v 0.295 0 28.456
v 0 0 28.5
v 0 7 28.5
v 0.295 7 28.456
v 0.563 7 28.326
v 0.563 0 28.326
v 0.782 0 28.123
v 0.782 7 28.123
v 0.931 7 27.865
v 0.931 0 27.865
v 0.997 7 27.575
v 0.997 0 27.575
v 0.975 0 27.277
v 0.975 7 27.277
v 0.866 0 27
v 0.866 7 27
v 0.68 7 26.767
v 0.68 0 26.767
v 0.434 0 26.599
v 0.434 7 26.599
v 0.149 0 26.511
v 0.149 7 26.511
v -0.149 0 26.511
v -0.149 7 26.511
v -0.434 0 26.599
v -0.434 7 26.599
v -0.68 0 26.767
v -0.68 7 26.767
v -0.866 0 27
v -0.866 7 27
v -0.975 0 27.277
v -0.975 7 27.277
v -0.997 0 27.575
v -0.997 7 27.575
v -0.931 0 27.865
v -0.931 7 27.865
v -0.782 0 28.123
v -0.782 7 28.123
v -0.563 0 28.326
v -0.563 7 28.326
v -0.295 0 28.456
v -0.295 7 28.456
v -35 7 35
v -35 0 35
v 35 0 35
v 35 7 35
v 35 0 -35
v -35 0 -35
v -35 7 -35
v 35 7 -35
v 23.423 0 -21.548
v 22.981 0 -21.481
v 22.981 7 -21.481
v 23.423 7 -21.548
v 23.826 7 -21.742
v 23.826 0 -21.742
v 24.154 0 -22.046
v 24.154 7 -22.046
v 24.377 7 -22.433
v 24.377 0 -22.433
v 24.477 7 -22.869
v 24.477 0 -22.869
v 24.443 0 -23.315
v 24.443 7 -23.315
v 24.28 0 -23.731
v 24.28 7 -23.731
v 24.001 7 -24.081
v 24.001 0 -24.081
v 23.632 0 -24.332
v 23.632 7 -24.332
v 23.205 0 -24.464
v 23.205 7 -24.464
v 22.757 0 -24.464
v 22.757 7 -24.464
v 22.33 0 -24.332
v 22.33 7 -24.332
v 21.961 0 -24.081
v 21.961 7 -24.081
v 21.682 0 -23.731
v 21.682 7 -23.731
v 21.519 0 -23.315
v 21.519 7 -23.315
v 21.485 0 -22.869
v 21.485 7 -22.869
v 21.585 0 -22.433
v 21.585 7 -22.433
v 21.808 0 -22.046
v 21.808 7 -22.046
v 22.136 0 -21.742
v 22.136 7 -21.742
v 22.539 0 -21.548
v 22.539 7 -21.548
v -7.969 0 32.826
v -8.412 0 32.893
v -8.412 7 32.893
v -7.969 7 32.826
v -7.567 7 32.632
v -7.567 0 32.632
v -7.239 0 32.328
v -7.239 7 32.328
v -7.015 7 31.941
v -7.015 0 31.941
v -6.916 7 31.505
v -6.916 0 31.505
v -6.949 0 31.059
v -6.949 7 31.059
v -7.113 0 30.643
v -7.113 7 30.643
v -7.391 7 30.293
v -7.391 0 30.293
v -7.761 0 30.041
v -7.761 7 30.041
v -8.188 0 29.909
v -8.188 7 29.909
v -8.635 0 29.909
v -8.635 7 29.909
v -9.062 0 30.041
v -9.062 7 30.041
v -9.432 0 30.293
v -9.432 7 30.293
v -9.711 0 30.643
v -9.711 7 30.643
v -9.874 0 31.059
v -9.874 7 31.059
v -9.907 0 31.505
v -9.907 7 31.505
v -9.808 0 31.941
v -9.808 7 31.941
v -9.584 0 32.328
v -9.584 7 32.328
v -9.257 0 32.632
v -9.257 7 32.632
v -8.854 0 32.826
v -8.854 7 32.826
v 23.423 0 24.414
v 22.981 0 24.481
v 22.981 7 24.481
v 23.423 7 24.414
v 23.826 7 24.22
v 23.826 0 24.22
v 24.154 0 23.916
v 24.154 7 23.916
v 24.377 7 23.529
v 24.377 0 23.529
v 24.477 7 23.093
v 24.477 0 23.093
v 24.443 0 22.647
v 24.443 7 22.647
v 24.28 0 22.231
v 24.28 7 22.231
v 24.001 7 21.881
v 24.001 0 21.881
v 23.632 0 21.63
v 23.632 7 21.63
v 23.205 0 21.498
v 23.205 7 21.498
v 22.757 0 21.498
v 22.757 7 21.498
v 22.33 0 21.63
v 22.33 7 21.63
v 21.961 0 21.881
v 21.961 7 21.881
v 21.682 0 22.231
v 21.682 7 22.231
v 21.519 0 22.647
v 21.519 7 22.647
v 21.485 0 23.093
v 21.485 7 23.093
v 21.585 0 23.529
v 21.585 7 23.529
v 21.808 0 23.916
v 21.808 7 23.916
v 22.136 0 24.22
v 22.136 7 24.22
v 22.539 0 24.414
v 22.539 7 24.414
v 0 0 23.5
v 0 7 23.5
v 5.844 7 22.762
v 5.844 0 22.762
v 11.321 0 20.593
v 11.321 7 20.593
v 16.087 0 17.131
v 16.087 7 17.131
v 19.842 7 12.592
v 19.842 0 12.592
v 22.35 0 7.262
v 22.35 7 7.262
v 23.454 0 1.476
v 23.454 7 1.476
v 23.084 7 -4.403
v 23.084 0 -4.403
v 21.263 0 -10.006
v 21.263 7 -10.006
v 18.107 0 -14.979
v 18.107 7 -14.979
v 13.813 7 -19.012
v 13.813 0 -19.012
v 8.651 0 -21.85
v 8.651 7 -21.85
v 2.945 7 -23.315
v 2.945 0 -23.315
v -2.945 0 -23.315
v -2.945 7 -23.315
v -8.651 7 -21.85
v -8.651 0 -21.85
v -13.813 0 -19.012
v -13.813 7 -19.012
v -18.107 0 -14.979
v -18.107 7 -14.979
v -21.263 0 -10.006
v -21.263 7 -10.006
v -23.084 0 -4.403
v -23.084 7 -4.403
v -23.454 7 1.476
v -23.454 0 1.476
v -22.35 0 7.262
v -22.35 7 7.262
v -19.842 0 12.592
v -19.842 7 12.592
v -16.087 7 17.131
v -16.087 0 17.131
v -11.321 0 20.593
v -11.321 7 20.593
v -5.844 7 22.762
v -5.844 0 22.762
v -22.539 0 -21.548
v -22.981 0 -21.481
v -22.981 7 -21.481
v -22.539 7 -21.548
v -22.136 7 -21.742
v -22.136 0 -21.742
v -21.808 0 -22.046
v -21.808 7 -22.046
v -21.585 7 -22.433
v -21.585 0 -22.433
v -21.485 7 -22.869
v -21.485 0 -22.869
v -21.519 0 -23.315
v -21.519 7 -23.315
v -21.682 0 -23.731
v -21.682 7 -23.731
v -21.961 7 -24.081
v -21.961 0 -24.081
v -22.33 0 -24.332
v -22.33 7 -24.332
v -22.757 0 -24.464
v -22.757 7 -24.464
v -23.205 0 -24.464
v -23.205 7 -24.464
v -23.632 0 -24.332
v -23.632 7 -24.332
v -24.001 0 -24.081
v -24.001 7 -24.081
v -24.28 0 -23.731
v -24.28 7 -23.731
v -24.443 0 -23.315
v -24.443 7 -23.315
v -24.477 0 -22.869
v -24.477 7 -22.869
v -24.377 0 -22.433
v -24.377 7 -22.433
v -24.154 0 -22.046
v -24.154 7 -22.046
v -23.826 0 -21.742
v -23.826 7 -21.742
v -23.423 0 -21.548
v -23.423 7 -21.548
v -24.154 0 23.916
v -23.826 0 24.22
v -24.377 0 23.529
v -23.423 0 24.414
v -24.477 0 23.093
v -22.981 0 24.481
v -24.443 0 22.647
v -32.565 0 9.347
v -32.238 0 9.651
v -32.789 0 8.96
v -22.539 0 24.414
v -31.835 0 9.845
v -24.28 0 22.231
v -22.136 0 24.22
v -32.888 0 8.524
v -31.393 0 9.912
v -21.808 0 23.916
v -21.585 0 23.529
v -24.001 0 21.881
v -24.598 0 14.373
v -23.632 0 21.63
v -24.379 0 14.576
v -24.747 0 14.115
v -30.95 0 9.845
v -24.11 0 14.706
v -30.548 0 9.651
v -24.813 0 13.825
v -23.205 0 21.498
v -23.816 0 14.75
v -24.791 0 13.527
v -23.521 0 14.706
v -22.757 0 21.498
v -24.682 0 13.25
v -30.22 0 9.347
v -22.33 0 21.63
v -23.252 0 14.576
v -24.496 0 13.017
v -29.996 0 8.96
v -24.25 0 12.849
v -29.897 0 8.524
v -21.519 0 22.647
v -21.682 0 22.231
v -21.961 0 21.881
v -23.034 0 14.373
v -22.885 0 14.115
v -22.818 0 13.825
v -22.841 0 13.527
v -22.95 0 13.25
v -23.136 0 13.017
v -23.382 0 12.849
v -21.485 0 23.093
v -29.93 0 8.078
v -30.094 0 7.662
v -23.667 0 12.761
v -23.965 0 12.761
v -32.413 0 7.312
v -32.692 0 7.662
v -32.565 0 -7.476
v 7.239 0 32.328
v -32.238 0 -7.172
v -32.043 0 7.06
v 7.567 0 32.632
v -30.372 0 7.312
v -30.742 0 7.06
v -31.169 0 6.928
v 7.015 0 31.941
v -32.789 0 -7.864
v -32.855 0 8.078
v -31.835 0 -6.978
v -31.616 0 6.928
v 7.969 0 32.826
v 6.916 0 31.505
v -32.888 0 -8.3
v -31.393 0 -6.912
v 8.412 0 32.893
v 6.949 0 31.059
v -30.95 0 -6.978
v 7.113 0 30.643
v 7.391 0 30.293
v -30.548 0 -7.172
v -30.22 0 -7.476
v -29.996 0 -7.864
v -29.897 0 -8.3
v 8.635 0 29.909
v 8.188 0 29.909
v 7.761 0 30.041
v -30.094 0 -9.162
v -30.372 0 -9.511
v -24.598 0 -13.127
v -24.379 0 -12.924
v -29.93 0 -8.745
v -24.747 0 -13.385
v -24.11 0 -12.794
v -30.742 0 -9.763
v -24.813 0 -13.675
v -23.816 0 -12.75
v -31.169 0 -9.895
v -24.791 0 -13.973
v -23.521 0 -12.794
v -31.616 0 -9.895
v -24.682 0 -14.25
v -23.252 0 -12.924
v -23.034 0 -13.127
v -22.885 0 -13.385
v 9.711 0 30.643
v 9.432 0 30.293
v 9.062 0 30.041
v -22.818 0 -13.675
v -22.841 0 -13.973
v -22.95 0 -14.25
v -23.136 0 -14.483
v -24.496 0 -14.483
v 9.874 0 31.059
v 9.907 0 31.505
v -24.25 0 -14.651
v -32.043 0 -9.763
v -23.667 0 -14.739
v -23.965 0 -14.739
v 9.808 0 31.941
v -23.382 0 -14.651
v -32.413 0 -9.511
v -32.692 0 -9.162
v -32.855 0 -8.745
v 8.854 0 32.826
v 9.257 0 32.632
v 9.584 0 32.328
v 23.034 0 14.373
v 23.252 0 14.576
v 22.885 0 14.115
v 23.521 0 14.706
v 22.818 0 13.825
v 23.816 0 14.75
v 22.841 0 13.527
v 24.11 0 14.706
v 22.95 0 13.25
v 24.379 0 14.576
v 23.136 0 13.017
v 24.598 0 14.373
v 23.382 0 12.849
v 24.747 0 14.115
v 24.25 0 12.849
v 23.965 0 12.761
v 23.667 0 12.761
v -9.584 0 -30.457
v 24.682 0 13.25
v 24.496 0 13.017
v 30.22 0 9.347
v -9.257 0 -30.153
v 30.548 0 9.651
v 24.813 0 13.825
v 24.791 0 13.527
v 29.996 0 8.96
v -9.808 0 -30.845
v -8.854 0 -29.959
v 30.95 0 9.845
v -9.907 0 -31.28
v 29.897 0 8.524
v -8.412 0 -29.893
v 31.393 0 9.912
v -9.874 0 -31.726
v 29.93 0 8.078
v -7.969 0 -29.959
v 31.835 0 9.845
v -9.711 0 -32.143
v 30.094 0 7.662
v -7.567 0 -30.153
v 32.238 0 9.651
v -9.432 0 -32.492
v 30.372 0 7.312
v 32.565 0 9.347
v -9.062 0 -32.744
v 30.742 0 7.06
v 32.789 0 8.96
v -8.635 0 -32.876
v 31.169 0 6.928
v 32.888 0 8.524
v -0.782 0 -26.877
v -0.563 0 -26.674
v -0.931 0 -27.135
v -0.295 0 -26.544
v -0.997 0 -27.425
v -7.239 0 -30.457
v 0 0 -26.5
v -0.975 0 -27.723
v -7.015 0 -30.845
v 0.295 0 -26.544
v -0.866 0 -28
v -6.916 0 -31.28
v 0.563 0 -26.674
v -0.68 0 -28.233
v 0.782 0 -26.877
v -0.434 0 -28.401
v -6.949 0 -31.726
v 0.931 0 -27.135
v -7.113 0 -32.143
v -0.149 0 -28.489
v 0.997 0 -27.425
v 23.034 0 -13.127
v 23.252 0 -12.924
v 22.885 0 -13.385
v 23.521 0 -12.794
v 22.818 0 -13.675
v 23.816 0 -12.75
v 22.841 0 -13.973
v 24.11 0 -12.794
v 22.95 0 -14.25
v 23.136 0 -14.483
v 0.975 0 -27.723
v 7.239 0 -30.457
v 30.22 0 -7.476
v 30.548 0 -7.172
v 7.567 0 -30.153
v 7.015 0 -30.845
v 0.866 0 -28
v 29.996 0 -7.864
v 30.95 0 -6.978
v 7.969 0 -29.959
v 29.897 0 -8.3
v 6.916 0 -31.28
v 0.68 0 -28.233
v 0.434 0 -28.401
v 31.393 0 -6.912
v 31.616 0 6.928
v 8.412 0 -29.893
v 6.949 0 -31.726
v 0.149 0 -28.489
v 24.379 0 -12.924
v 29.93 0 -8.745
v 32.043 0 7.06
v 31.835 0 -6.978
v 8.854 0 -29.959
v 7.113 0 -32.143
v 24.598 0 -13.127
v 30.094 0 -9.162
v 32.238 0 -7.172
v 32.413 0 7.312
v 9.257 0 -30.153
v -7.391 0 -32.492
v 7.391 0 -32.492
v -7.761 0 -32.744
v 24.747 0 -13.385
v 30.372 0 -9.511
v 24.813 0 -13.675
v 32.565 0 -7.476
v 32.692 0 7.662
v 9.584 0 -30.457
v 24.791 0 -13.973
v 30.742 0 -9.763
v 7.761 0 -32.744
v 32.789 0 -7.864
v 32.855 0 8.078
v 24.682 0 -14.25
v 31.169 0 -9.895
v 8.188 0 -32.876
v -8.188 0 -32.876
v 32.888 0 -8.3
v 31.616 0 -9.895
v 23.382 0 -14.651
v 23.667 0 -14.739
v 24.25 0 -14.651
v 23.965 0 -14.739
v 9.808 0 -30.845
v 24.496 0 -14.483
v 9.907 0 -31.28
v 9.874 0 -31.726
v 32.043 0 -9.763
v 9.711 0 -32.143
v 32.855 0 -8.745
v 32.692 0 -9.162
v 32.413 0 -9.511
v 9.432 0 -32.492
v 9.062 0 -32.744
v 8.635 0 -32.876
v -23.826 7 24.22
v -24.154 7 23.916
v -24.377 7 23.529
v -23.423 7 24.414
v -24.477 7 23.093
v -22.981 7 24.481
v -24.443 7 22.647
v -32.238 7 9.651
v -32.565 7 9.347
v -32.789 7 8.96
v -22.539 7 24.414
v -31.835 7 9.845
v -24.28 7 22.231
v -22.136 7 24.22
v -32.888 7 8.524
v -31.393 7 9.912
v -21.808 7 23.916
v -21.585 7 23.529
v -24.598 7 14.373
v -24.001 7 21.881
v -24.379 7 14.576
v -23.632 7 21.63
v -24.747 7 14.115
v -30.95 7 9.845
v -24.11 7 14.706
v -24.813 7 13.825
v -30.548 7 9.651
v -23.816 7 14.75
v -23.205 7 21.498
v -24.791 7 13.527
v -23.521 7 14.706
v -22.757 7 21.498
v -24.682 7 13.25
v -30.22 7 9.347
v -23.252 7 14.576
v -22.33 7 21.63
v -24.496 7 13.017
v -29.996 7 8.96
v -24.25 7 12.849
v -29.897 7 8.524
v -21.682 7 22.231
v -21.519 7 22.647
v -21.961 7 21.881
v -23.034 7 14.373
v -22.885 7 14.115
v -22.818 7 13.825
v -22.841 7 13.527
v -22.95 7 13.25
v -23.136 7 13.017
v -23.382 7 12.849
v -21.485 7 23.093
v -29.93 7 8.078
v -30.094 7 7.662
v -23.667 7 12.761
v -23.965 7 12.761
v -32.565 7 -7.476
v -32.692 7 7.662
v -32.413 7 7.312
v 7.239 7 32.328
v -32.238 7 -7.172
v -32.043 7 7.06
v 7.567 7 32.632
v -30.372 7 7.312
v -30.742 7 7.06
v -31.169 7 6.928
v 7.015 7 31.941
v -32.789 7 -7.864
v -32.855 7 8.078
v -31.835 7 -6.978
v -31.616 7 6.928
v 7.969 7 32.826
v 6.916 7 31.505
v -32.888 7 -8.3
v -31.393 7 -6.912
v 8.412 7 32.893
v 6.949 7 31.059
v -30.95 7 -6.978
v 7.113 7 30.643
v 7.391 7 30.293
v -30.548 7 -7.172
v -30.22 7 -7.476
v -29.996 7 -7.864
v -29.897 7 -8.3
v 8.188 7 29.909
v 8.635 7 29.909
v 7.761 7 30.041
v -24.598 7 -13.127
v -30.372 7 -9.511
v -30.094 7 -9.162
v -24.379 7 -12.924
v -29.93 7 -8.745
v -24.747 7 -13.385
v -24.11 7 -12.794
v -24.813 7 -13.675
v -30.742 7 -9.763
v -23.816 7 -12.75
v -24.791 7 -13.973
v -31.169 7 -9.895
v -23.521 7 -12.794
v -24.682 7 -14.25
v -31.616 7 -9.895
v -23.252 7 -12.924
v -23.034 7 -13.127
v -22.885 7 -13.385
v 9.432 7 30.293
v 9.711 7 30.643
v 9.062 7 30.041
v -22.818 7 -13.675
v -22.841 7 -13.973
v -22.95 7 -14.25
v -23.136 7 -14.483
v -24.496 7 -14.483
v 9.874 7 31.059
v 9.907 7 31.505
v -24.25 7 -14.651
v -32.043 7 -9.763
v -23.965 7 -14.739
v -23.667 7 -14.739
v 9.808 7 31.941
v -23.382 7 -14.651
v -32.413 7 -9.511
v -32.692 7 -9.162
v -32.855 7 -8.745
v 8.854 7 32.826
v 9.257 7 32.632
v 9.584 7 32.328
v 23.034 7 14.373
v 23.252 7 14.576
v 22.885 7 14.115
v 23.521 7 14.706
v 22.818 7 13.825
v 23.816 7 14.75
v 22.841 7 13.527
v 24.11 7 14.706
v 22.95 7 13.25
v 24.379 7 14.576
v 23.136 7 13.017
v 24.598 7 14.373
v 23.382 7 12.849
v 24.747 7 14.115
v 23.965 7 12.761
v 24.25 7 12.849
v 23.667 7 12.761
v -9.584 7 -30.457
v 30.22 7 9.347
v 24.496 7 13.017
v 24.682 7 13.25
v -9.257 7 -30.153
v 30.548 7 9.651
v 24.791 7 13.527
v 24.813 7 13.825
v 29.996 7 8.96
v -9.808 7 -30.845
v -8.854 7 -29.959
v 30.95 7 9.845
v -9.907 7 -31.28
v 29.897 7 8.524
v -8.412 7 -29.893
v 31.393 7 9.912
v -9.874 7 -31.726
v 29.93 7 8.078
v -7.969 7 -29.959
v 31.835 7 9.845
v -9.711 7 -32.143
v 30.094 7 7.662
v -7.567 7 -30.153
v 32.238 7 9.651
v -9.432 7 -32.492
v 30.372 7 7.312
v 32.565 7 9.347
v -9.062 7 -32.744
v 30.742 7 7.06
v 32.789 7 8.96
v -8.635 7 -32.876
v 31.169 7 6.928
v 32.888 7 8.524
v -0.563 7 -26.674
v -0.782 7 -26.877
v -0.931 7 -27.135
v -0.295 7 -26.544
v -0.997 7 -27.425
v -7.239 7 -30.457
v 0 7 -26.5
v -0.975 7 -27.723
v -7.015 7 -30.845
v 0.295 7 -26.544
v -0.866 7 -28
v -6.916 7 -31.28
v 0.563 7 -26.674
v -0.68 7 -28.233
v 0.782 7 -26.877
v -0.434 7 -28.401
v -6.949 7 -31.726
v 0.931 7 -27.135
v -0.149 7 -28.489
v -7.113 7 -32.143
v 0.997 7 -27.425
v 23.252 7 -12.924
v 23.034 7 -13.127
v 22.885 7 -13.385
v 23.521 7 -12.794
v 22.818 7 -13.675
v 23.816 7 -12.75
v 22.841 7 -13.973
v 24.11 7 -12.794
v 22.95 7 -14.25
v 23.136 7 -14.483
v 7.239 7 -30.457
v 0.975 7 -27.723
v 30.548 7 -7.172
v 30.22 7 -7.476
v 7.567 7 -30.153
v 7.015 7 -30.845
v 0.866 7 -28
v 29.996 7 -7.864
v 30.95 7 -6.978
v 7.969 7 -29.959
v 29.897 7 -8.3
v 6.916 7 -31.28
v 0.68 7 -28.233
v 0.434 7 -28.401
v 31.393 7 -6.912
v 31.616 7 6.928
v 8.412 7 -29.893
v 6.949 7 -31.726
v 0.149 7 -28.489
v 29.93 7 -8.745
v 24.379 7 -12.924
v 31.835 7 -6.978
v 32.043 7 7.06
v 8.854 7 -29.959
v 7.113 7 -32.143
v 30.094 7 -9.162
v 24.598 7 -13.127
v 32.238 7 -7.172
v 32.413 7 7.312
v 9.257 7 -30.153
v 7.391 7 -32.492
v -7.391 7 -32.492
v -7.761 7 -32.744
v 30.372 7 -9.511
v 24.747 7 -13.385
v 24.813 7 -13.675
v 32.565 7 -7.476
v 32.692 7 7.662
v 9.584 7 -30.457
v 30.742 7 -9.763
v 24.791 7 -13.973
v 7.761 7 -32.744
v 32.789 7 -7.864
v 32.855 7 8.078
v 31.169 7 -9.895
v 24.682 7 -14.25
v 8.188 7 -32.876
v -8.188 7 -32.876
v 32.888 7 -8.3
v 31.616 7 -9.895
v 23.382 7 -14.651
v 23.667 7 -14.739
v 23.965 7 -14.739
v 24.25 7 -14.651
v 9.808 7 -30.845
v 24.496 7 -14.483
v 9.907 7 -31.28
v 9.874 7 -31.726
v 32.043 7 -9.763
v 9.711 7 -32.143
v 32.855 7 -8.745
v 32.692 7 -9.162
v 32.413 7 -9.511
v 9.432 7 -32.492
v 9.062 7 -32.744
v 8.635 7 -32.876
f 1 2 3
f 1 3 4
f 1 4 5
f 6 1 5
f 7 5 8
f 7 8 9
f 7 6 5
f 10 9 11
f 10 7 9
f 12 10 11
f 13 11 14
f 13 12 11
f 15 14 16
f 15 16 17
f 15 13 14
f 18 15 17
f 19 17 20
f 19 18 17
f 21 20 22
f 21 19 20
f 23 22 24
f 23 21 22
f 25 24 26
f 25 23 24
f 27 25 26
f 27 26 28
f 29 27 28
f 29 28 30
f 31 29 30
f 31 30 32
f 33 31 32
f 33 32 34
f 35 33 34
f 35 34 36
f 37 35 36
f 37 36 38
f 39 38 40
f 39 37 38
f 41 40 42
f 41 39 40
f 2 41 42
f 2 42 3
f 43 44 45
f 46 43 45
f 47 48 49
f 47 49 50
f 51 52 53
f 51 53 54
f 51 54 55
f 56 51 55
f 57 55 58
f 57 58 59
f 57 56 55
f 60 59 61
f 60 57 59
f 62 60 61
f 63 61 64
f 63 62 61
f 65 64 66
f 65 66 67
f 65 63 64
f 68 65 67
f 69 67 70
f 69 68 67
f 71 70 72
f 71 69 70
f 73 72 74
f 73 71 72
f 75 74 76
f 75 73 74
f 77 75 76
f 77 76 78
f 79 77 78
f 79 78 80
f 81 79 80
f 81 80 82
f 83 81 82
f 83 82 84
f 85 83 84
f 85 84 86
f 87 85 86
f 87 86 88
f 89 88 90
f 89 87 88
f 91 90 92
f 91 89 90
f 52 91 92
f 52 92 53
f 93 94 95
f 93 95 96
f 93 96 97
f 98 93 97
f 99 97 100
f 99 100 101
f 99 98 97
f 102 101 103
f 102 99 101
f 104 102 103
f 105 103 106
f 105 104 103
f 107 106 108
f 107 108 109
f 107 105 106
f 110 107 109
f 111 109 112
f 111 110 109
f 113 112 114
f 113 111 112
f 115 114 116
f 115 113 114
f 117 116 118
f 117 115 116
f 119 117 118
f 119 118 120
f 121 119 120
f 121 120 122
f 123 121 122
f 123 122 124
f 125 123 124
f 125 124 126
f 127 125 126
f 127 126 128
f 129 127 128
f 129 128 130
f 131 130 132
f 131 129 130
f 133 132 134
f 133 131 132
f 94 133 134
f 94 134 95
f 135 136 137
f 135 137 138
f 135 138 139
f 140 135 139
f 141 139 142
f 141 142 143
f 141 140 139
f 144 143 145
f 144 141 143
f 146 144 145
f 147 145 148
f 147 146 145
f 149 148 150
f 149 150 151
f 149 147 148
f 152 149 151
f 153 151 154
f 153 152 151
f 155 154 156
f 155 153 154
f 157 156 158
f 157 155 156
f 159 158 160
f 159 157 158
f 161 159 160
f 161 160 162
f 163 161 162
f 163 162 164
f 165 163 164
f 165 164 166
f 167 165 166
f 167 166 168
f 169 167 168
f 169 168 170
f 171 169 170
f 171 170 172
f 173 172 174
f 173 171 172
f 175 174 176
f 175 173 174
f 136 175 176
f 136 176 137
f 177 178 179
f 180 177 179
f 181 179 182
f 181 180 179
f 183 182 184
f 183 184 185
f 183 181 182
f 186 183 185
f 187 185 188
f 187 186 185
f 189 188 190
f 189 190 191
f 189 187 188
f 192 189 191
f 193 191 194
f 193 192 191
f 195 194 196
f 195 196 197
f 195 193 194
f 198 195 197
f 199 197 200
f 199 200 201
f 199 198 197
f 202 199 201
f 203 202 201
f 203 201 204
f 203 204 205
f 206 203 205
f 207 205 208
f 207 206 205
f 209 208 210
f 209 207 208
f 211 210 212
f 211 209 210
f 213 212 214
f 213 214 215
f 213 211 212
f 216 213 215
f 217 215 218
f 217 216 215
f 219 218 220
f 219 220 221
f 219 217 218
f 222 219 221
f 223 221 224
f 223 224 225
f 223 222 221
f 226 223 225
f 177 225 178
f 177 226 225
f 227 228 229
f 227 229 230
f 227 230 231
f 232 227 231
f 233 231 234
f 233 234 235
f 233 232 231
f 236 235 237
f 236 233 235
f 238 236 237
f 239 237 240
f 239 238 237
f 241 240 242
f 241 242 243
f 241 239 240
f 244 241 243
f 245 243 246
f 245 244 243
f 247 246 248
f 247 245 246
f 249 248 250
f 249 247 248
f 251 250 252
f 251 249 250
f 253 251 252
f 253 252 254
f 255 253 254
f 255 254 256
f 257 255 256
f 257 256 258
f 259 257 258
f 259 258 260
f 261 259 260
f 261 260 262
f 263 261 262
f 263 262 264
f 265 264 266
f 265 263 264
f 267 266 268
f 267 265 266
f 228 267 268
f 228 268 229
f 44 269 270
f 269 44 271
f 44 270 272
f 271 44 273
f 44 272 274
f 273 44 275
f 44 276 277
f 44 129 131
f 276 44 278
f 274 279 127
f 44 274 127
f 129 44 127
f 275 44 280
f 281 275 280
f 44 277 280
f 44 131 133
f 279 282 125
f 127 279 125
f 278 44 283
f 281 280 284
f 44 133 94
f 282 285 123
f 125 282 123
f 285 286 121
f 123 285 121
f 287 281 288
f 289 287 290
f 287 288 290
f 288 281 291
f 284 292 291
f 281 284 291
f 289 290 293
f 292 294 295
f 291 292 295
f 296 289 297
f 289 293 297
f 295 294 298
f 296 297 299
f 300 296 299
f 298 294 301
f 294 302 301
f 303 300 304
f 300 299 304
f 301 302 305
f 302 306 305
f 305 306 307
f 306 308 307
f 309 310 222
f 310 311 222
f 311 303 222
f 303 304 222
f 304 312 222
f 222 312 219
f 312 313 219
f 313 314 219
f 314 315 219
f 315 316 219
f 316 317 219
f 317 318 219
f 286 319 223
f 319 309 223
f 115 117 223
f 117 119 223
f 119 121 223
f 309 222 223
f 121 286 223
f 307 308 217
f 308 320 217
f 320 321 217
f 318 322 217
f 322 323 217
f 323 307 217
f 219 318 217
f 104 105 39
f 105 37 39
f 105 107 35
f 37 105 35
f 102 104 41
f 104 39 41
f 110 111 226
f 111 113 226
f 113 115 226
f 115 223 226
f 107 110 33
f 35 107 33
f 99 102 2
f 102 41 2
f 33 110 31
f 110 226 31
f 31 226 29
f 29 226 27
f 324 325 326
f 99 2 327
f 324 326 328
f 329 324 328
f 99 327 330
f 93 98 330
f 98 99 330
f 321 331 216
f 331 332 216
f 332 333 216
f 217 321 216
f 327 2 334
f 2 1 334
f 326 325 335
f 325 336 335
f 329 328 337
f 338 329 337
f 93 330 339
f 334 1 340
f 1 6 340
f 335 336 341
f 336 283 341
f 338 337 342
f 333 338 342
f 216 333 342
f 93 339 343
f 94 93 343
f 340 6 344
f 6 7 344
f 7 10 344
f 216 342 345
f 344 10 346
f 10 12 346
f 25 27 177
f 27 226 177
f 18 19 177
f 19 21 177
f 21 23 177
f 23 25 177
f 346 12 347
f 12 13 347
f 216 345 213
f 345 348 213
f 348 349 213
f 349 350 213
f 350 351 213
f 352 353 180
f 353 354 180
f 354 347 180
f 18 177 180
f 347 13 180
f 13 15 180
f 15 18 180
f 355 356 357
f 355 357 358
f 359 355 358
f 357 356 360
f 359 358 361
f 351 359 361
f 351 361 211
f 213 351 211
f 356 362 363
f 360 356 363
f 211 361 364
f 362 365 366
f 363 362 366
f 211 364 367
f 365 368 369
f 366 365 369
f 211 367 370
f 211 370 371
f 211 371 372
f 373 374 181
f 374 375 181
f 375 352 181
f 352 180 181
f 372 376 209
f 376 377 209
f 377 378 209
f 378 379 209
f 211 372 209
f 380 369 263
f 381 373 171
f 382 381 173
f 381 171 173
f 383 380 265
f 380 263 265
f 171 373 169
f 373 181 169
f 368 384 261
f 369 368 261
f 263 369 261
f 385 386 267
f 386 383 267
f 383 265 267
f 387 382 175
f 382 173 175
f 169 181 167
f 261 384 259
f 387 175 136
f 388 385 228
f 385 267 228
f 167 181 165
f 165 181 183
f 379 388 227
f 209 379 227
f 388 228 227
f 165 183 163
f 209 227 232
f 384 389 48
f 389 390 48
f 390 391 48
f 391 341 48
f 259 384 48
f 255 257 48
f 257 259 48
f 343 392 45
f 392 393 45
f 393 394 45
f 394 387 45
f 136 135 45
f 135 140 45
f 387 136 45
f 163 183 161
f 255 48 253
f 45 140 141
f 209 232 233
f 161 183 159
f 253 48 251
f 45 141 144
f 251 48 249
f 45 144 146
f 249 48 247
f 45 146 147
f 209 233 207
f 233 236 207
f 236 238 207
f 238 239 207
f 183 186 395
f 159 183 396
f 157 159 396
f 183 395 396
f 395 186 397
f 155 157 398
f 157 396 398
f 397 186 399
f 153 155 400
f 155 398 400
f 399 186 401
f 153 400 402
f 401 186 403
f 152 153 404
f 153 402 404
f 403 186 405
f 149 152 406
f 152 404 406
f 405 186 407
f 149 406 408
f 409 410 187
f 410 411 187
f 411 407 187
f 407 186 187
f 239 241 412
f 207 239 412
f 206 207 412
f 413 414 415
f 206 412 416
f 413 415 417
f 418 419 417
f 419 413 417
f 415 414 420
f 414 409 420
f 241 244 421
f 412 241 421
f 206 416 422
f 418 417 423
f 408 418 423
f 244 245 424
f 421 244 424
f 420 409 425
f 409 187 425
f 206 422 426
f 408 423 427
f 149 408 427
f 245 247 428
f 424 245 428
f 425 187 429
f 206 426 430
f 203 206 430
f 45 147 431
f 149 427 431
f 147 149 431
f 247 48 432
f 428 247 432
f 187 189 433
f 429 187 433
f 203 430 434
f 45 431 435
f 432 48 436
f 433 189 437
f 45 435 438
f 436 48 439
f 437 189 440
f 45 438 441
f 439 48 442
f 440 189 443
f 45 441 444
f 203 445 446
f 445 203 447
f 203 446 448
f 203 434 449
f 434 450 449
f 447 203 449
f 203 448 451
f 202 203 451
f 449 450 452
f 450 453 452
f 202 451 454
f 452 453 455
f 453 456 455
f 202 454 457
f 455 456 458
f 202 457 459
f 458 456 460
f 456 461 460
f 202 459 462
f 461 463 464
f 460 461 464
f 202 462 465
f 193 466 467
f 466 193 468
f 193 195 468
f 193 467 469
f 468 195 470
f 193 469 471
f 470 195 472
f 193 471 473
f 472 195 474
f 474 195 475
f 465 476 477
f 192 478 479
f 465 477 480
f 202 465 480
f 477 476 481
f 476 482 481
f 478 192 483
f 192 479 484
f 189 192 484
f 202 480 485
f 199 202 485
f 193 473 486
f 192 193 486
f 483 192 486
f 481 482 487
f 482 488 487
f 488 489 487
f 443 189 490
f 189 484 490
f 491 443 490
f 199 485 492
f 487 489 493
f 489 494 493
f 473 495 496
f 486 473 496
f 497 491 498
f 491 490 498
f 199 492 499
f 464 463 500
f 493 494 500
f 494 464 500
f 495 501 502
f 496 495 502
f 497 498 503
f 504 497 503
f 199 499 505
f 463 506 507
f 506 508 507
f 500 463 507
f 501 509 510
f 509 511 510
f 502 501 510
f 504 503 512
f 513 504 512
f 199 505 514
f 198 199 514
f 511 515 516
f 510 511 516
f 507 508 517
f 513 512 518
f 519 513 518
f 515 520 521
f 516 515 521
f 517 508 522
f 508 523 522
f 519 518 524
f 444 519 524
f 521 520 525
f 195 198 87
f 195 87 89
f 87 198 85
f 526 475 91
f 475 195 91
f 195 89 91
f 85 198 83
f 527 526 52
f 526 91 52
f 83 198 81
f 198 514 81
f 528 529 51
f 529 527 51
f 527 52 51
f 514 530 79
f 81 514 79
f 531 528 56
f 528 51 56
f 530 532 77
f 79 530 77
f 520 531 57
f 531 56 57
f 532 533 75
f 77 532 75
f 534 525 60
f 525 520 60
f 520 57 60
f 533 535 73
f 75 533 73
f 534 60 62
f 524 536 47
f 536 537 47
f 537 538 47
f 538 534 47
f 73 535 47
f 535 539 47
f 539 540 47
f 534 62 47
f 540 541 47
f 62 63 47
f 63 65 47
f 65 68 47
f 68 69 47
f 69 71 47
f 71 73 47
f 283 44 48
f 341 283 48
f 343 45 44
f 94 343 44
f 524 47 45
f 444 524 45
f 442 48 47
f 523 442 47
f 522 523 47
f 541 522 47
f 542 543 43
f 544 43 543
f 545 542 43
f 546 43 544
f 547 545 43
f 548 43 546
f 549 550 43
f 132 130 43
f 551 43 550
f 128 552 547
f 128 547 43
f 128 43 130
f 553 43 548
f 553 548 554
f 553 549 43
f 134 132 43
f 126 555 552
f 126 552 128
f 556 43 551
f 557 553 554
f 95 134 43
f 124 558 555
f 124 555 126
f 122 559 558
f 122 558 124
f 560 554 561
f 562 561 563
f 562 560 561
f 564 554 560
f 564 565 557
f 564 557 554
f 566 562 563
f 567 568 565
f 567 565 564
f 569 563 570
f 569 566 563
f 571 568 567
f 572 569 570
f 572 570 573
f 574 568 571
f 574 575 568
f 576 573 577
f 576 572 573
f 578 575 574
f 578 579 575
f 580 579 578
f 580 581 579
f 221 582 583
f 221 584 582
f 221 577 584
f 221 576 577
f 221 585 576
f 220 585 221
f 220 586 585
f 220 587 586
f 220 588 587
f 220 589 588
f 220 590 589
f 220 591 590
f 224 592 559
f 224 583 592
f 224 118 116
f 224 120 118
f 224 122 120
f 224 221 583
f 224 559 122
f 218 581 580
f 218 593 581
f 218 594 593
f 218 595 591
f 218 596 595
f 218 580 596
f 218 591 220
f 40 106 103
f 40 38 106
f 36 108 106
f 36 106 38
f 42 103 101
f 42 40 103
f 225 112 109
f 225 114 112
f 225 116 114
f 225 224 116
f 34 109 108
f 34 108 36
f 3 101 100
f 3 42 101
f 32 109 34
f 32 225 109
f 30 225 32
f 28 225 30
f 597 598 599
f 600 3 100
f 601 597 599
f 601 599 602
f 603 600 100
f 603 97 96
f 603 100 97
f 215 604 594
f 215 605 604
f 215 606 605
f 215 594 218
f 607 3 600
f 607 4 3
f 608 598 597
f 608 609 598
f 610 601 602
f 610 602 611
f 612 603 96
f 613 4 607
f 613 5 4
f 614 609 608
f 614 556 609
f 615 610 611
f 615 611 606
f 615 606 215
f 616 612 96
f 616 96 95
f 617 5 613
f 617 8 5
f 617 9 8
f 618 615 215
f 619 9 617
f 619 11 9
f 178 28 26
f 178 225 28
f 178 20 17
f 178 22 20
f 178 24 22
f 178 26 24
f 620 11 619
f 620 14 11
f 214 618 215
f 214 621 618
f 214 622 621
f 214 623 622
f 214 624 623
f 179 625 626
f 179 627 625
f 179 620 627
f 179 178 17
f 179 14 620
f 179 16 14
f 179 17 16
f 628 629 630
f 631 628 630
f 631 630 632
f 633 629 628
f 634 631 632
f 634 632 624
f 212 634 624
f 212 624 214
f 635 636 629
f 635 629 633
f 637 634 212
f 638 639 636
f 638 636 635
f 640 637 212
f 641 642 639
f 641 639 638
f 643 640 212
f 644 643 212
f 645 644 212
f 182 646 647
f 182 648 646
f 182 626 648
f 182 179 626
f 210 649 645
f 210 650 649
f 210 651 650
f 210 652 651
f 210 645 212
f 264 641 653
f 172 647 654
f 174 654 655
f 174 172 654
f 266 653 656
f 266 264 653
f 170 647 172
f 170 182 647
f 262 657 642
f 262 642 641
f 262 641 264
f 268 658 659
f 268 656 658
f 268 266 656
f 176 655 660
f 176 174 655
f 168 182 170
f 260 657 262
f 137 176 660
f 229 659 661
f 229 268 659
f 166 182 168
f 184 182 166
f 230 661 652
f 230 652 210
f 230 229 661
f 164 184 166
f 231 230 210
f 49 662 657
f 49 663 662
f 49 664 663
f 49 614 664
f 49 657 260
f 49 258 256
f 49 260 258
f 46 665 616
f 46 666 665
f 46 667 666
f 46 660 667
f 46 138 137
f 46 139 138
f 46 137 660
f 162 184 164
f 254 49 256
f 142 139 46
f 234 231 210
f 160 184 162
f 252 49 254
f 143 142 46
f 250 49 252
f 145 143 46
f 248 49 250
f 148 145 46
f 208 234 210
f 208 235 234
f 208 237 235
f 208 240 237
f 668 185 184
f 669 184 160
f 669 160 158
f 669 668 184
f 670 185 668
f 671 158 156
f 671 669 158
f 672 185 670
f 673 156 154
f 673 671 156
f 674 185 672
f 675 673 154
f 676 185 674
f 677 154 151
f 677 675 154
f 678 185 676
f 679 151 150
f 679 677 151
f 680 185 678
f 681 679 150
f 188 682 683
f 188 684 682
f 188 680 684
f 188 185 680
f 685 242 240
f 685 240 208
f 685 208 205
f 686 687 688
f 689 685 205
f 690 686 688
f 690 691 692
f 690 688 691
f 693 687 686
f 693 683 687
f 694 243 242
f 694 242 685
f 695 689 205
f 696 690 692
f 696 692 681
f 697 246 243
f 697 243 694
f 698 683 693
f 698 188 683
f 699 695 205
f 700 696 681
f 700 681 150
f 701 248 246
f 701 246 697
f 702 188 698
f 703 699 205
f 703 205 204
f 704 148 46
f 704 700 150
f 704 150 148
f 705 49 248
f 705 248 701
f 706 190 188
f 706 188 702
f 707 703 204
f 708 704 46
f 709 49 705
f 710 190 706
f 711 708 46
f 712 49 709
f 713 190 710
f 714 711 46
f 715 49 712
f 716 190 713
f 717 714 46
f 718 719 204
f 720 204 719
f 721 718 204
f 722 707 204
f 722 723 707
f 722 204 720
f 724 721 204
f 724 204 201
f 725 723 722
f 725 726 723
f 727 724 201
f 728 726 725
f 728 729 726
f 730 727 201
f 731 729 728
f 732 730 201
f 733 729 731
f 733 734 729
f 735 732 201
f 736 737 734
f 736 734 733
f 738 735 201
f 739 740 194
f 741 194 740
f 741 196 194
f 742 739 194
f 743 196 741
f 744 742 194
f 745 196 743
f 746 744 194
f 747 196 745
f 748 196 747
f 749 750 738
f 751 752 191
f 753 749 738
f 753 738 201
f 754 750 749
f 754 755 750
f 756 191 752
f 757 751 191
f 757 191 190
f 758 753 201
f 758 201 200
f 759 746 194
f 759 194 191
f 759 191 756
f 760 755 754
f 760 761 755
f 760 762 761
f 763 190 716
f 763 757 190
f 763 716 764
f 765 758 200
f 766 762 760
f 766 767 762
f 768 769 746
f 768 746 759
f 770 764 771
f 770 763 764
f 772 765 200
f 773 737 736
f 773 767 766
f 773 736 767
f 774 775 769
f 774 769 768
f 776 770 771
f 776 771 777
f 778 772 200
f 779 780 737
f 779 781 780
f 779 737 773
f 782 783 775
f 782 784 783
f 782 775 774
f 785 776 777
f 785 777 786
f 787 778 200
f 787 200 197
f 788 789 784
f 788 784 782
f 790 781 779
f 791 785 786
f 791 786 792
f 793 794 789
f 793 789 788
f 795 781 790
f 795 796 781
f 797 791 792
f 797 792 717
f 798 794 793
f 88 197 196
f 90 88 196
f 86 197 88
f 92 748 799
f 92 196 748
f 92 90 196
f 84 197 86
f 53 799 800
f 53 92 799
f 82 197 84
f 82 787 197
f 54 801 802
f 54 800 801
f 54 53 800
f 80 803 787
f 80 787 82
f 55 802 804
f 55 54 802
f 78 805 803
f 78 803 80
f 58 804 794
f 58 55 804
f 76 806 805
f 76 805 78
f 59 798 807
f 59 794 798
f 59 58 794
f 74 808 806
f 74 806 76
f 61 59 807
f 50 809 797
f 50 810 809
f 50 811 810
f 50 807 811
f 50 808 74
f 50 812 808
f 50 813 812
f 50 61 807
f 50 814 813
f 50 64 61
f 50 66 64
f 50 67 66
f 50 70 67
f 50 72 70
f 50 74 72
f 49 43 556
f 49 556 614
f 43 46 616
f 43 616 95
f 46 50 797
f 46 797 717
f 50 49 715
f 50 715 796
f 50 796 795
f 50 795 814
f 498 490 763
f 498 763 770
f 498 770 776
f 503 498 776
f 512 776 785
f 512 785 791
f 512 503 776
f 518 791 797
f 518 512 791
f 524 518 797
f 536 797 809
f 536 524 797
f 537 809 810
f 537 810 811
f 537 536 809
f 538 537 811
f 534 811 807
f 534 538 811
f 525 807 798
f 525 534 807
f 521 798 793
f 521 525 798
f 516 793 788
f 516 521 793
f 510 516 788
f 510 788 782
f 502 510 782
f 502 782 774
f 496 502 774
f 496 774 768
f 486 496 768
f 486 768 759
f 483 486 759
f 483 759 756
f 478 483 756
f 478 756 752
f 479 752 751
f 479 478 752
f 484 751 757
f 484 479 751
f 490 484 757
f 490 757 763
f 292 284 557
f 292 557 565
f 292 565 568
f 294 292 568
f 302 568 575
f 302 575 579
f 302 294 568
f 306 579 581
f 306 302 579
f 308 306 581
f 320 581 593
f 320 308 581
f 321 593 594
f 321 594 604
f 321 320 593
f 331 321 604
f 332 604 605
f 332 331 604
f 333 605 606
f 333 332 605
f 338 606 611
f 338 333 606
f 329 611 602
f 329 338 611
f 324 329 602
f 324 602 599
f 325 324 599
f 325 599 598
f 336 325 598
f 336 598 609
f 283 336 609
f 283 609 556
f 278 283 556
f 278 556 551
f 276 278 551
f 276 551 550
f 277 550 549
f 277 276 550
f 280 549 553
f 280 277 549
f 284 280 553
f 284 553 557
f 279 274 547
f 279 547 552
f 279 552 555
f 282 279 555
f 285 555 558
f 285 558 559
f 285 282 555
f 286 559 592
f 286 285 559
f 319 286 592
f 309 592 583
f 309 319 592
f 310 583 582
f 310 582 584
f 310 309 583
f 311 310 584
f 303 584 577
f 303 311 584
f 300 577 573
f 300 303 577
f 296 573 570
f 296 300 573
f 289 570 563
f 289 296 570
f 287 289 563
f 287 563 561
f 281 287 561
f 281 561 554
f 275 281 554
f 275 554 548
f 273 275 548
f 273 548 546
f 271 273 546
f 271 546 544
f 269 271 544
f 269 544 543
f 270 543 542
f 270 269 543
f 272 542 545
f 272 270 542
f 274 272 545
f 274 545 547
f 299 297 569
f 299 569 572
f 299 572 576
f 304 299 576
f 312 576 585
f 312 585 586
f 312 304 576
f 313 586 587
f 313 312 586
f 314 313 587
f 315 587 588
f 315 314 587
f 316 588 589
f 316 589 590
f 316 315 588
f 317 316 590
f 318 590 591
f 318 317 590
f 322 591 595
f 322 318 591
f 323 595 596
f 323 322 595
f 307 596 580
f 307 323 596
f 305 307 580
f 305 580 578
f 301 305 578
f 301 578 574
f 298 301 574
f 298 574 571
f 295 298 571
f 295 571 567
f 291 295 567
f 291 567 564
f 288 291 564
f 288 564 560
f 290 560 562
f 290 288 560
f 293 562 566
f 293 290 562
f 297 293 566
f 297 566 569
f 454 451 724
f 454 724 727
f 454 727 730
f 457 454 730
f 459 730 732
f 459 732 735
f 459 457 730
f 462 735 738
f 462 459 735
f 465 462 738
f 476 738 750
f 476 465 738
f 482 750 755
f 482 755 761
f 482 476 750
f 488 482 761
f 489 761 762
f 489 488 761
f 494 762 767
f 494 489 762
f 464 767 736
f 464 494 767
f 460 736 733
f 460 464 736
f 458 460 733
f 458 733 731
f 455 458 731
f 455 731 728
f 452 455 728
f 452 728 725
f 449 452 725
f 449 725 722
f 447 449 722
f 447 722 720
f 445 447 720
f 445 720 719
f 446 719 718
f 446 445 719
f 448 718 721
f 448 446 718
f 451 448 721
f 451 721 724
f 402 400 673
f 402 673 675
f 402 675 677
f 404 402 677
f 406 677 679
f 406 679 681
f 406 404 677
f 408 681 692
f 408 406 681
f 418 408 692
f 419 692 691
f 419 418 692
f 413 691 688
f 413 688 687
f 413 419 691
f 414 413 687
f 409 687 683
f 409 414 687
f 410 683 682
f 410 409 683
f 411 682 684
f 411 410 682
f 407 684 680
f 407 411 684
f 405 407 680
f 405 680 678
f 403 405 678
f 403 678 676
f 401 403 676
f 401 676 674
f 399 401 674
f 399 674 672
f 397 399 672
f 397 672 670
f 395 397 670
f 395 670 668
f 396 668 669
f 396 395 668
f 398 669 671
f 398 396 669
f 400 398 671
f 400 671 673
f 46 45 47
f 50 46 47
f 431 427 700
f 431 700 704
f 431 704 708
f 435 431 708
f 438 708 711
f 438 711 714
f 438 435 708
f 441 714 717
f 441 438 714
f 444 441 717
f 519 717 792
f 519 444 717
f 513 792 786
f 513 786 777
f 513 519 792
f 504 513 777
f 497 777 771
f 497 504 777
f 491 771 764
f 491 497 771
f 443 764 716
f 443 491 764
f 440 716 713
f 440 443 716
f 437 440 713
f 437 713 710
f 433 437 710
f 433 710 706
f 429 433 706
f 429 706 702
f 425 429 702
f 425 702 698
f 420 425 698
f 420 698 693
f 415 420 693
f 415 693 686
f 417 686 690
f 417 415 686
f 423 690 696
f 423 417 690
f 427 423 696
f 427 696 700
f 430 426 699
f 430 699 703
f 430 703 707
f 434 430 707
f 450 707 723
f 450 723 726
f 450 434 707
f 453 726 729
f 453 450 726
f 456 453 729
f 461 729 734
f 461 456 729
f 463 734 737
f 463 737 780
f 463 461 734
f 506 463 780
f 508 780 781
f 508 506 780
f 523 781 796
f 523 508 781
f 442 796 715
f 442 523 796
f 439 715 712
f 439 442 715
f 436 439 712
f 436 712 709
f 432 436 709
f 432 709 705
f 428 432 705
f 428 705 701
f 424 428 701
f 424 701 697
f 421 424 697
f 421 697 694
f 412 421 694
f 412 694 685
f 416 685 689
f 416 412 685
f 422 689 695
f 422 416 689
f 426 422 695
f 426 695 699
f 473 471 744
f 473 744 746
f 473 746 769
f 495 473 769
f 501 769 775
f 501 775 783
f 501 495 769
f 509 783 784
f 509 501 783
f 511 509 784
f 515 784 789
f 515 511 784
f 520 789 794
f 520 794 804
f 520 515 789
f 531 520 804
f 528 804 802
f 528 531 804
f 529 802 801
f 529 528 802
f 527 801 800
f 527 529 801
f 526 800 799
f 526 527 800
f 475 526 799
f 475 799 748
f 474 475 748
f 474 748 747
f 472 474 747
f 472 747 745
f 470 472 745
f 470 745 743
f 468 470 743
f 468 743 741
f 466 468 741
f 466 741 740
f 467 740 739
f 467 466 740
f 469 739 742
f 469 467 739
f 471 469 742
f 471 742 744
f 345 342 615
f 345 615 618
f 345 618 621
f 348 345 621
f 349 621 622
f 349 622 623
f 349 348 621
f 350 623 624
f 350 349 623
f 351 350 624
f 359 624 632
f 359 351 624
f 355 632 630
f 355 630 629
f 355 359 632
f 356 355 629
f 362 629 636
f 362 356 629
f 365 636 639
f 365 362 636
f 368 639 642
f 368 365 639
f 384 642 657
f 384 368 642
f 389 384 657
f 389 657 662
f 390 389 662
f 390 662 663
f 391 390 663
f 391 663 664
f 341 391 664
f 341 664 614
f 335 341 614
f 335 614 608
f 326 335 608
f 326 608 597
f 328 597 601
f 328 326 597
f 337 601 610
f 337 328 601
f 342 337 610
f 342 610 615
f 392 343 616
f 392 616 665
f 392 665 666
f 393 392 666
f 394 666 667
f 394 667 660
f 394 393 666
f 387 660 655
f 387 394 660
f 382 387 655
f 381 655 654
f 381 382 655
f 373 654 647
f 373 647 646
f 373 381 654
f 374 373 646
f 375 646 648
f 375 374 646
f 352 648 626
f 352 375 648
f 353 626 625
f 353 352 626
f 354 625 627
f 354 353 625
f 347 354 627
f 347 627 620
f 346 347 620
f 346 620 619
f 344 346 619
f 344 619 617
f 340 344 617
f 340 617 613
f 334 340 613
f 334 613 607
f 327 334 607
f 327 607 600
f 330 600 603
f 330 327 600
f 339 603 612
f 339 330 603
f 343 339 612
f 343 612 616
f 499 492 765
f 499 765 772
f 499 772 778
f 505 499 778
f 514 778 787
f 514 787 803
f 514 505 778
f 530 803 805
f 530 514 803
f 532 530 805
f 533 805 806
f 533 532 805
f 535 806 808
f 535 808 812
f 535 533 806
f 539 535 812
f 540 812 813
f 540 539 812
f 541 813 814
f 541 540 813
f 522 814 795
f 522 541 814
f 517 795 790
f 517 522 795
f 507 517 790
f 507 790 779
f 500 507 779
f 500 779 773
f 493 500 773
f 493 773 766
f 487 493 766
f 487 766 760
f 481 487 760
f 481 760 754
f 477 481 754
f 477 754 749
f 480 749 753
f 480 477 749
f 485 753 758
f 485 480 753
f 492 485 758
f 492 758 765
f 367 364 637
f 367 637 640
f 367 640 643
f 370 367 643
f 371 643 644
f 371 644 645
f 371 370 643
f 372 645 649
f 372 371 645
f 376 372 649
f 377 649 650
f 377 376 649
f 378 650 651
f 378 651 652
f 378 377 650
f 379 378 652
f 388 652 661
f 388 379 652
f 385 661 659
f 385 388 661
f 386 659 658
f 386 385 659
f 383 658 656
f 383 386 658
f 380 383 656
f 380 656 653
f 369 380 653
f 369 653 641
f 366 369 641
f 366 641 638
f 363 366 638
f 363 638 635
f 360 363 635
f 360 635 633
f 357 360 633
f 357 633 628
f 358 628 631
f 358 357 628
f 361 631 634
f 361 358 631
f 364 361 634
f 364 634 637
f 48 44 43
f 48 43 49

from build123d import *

# Parameters (mm, degrees)
SKETCH1_W           = 70
SKETCH1_H           = 70
SKETCH1_R           = 23.5
SKETCH1_R_2         = 1
SKETCH1_R_3         = 1.5
BOSS_EXTRUDE1_DEPTH = 7


with BuildPart() as part:
    # Sketch1 → Boss-Extrude1 (new body)
    with BuildSketch(Plane(origin=(0, 0, 0), x_dir=(1, 0, 0), z_dir=(0, 1, 0))):
        Rectangle(SKETCH1_W, SKETCH1_H)
        with Locations(Location((0, 0, 0), (0, 0, 270))):
            Circle(SKETCH1_R, mode=Mode.SUBTRACT)
        with Locations(Location((0, 27.5, 0), (0, 0, 270))):
            Circle(SKETCH1_R_2, mode=Mode.SUBTRACT)
        with Locations(Location((23.815698604, 13.75, 0), (0, 0, 270))):
            Circle(SKETCH1_R_2, mode=Mode.SUBTRACT)
        with Locations(Location((23.815698604, -13.75, 0), (0, 0, 270))):
            Circle(SKETCH1_R_2, mode=Mode.SUBTRACT)
        with Locations(Location((0, -27.5, 0), (0, 0, 270))):
            Circle(SKETCH1_R_2, mode=Mode.SUBTRACT)
        with Locations(Location((-23.815698604, -13.75, 0), (0, 0, 270))):
            Circle(SKETCH1_R_2, mode=Mode.SUBTRACT)
        with Locations(Location((-23.815698604, 13.75, 0), (0, 0, 270))):
            Circle(SKETCH1_R_2, mode=Mode.SUBTRACT)
        with Locations(Location((-31.392589354, -8.411618966, 0), (0, 0, 270))):
            Circle(SKETCH1_R_3, mode=Mode.SUBTRACT)
        with Locations(Location((-31.392589354, 8.411618966, 0), (0, 0, 270))):
            Circle(SKETCH1_R_3, mode=Mode.SUBTRACT)
        with Locations(Location((-22.980970389, 22.980970389, 0), (0, 0, 270))):
            Circle(SKETCH1_R_3, mode=Mode.SUBTRACT)
        with Locations(Location((-8.411618966, 31.392589354, 0), (0, 0, 270))):
            Circle(SKETCH1_R_3, mode=Mode.SUBTRACT)
        with Locations(Location((8.411618966, 31.392589354, 0), (0, 0, 270))):
            Circle(SKETCH1_R_3, mode=Mode.SUBTRACT)
        with Locations(Location((22.980970389, 22.980970389, 0), (0, 0, 270))):
            Circle(SKETCH1_R_3, mode=Mode.SUBTRACT)
        with Locations(Location((31.392589354, 8.411618966, 0), (0, 0, 270))):
            Circle(SKETCH1_R_3, mode=Mode.SUBTRACT)
        with Locations(Location((31.392589354, -8.411618966, 0), (0, 0, 270))):
            Circle(SKETCH1_R_3, mode=Mode.SUBTRACT)
        with Locations(Location((22.980970389, -22.980970389, 0), (0, 0, 270))):
            Circle(SKETCH1_R_3, mode=Mode.SUBTRACT)
        with Locations(Location((8.411618966, -31.392589354, 0), (0, 0, 270))):
            Circle(SKETCH1_R_3, mode=Mode.SUBTRACT)
        with Locations(Location((-8.411618966, -31.392589354, 0), (0, 0, 270))):
            Circle(SKETCH1_R_3, mode=Mode.SUBTRACT)
        with Locations(Location((-22.980970389, -22.980970389, 0), (0, 0, 270))):
            Circle(SKETCH1_R_3, mode=Mode.SUBTRACT)
    extrude(amount=BOSS_EXTRUDE1_DEPTH)


solid = part.part
